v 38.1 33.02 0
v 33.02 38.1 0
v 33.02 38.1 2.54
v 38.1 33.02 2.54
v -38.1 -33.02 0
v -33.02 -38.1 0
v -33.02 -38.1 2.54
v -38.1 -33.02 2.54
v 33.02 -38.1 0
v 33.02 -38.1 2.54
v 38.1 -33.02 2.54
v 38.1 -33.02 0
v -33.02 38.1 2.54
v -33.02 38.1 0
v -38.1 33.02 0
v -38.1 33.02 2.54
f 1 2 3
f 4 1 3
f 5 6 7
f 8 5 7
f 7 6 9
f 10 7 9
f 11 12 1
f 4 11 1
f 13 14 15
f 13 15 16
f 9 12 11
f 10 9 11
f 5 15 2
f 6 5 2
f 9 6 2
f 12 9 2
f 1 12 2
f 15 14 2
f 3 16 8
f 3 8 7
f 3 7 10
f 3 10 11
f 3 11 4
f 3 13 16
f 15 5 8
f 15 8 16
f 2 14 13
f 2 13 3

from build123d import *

# Parameters (mm, degrees)
F0_W     = 76.2
F0_H     = 76.2
F1_DEPTH = 2.54
F3_W     = 76.2
F3_H     = 76.2
F4_DEPTH = 2.54
F5_SIZE  = 5.08


with BuildPart() as f1:
    # F0 (on Top) → F1 (new body)
    with BuildSketch(Plane.XY):
        with Locations((-53.6030647397, 0.9952480853)):
            Rectangle(F0_W, F0_H)
    extrude(amount=F1_DEPTH)


with BuildPart() as f4:
    # F3 (on Top) → F4 (new body)
    with BuildSketch(Plane.XY):
        Rectangle(F3_W, F3_H)
    extrude(amount=F4_DEPTH)

    # F5
    f5_edges = [f4.edges().sort_by_distance(p)[0] for p in [
        (-38.1, -38.1, 1.27),
        (-38.1, 38.1, 1.27),
        (38.1, 38.1, 1.27),
        (38.1, -38.1, 1.27),
    ]]
    chamfer(f5_edges, length=F5_SIZE)


solid = f4.part
